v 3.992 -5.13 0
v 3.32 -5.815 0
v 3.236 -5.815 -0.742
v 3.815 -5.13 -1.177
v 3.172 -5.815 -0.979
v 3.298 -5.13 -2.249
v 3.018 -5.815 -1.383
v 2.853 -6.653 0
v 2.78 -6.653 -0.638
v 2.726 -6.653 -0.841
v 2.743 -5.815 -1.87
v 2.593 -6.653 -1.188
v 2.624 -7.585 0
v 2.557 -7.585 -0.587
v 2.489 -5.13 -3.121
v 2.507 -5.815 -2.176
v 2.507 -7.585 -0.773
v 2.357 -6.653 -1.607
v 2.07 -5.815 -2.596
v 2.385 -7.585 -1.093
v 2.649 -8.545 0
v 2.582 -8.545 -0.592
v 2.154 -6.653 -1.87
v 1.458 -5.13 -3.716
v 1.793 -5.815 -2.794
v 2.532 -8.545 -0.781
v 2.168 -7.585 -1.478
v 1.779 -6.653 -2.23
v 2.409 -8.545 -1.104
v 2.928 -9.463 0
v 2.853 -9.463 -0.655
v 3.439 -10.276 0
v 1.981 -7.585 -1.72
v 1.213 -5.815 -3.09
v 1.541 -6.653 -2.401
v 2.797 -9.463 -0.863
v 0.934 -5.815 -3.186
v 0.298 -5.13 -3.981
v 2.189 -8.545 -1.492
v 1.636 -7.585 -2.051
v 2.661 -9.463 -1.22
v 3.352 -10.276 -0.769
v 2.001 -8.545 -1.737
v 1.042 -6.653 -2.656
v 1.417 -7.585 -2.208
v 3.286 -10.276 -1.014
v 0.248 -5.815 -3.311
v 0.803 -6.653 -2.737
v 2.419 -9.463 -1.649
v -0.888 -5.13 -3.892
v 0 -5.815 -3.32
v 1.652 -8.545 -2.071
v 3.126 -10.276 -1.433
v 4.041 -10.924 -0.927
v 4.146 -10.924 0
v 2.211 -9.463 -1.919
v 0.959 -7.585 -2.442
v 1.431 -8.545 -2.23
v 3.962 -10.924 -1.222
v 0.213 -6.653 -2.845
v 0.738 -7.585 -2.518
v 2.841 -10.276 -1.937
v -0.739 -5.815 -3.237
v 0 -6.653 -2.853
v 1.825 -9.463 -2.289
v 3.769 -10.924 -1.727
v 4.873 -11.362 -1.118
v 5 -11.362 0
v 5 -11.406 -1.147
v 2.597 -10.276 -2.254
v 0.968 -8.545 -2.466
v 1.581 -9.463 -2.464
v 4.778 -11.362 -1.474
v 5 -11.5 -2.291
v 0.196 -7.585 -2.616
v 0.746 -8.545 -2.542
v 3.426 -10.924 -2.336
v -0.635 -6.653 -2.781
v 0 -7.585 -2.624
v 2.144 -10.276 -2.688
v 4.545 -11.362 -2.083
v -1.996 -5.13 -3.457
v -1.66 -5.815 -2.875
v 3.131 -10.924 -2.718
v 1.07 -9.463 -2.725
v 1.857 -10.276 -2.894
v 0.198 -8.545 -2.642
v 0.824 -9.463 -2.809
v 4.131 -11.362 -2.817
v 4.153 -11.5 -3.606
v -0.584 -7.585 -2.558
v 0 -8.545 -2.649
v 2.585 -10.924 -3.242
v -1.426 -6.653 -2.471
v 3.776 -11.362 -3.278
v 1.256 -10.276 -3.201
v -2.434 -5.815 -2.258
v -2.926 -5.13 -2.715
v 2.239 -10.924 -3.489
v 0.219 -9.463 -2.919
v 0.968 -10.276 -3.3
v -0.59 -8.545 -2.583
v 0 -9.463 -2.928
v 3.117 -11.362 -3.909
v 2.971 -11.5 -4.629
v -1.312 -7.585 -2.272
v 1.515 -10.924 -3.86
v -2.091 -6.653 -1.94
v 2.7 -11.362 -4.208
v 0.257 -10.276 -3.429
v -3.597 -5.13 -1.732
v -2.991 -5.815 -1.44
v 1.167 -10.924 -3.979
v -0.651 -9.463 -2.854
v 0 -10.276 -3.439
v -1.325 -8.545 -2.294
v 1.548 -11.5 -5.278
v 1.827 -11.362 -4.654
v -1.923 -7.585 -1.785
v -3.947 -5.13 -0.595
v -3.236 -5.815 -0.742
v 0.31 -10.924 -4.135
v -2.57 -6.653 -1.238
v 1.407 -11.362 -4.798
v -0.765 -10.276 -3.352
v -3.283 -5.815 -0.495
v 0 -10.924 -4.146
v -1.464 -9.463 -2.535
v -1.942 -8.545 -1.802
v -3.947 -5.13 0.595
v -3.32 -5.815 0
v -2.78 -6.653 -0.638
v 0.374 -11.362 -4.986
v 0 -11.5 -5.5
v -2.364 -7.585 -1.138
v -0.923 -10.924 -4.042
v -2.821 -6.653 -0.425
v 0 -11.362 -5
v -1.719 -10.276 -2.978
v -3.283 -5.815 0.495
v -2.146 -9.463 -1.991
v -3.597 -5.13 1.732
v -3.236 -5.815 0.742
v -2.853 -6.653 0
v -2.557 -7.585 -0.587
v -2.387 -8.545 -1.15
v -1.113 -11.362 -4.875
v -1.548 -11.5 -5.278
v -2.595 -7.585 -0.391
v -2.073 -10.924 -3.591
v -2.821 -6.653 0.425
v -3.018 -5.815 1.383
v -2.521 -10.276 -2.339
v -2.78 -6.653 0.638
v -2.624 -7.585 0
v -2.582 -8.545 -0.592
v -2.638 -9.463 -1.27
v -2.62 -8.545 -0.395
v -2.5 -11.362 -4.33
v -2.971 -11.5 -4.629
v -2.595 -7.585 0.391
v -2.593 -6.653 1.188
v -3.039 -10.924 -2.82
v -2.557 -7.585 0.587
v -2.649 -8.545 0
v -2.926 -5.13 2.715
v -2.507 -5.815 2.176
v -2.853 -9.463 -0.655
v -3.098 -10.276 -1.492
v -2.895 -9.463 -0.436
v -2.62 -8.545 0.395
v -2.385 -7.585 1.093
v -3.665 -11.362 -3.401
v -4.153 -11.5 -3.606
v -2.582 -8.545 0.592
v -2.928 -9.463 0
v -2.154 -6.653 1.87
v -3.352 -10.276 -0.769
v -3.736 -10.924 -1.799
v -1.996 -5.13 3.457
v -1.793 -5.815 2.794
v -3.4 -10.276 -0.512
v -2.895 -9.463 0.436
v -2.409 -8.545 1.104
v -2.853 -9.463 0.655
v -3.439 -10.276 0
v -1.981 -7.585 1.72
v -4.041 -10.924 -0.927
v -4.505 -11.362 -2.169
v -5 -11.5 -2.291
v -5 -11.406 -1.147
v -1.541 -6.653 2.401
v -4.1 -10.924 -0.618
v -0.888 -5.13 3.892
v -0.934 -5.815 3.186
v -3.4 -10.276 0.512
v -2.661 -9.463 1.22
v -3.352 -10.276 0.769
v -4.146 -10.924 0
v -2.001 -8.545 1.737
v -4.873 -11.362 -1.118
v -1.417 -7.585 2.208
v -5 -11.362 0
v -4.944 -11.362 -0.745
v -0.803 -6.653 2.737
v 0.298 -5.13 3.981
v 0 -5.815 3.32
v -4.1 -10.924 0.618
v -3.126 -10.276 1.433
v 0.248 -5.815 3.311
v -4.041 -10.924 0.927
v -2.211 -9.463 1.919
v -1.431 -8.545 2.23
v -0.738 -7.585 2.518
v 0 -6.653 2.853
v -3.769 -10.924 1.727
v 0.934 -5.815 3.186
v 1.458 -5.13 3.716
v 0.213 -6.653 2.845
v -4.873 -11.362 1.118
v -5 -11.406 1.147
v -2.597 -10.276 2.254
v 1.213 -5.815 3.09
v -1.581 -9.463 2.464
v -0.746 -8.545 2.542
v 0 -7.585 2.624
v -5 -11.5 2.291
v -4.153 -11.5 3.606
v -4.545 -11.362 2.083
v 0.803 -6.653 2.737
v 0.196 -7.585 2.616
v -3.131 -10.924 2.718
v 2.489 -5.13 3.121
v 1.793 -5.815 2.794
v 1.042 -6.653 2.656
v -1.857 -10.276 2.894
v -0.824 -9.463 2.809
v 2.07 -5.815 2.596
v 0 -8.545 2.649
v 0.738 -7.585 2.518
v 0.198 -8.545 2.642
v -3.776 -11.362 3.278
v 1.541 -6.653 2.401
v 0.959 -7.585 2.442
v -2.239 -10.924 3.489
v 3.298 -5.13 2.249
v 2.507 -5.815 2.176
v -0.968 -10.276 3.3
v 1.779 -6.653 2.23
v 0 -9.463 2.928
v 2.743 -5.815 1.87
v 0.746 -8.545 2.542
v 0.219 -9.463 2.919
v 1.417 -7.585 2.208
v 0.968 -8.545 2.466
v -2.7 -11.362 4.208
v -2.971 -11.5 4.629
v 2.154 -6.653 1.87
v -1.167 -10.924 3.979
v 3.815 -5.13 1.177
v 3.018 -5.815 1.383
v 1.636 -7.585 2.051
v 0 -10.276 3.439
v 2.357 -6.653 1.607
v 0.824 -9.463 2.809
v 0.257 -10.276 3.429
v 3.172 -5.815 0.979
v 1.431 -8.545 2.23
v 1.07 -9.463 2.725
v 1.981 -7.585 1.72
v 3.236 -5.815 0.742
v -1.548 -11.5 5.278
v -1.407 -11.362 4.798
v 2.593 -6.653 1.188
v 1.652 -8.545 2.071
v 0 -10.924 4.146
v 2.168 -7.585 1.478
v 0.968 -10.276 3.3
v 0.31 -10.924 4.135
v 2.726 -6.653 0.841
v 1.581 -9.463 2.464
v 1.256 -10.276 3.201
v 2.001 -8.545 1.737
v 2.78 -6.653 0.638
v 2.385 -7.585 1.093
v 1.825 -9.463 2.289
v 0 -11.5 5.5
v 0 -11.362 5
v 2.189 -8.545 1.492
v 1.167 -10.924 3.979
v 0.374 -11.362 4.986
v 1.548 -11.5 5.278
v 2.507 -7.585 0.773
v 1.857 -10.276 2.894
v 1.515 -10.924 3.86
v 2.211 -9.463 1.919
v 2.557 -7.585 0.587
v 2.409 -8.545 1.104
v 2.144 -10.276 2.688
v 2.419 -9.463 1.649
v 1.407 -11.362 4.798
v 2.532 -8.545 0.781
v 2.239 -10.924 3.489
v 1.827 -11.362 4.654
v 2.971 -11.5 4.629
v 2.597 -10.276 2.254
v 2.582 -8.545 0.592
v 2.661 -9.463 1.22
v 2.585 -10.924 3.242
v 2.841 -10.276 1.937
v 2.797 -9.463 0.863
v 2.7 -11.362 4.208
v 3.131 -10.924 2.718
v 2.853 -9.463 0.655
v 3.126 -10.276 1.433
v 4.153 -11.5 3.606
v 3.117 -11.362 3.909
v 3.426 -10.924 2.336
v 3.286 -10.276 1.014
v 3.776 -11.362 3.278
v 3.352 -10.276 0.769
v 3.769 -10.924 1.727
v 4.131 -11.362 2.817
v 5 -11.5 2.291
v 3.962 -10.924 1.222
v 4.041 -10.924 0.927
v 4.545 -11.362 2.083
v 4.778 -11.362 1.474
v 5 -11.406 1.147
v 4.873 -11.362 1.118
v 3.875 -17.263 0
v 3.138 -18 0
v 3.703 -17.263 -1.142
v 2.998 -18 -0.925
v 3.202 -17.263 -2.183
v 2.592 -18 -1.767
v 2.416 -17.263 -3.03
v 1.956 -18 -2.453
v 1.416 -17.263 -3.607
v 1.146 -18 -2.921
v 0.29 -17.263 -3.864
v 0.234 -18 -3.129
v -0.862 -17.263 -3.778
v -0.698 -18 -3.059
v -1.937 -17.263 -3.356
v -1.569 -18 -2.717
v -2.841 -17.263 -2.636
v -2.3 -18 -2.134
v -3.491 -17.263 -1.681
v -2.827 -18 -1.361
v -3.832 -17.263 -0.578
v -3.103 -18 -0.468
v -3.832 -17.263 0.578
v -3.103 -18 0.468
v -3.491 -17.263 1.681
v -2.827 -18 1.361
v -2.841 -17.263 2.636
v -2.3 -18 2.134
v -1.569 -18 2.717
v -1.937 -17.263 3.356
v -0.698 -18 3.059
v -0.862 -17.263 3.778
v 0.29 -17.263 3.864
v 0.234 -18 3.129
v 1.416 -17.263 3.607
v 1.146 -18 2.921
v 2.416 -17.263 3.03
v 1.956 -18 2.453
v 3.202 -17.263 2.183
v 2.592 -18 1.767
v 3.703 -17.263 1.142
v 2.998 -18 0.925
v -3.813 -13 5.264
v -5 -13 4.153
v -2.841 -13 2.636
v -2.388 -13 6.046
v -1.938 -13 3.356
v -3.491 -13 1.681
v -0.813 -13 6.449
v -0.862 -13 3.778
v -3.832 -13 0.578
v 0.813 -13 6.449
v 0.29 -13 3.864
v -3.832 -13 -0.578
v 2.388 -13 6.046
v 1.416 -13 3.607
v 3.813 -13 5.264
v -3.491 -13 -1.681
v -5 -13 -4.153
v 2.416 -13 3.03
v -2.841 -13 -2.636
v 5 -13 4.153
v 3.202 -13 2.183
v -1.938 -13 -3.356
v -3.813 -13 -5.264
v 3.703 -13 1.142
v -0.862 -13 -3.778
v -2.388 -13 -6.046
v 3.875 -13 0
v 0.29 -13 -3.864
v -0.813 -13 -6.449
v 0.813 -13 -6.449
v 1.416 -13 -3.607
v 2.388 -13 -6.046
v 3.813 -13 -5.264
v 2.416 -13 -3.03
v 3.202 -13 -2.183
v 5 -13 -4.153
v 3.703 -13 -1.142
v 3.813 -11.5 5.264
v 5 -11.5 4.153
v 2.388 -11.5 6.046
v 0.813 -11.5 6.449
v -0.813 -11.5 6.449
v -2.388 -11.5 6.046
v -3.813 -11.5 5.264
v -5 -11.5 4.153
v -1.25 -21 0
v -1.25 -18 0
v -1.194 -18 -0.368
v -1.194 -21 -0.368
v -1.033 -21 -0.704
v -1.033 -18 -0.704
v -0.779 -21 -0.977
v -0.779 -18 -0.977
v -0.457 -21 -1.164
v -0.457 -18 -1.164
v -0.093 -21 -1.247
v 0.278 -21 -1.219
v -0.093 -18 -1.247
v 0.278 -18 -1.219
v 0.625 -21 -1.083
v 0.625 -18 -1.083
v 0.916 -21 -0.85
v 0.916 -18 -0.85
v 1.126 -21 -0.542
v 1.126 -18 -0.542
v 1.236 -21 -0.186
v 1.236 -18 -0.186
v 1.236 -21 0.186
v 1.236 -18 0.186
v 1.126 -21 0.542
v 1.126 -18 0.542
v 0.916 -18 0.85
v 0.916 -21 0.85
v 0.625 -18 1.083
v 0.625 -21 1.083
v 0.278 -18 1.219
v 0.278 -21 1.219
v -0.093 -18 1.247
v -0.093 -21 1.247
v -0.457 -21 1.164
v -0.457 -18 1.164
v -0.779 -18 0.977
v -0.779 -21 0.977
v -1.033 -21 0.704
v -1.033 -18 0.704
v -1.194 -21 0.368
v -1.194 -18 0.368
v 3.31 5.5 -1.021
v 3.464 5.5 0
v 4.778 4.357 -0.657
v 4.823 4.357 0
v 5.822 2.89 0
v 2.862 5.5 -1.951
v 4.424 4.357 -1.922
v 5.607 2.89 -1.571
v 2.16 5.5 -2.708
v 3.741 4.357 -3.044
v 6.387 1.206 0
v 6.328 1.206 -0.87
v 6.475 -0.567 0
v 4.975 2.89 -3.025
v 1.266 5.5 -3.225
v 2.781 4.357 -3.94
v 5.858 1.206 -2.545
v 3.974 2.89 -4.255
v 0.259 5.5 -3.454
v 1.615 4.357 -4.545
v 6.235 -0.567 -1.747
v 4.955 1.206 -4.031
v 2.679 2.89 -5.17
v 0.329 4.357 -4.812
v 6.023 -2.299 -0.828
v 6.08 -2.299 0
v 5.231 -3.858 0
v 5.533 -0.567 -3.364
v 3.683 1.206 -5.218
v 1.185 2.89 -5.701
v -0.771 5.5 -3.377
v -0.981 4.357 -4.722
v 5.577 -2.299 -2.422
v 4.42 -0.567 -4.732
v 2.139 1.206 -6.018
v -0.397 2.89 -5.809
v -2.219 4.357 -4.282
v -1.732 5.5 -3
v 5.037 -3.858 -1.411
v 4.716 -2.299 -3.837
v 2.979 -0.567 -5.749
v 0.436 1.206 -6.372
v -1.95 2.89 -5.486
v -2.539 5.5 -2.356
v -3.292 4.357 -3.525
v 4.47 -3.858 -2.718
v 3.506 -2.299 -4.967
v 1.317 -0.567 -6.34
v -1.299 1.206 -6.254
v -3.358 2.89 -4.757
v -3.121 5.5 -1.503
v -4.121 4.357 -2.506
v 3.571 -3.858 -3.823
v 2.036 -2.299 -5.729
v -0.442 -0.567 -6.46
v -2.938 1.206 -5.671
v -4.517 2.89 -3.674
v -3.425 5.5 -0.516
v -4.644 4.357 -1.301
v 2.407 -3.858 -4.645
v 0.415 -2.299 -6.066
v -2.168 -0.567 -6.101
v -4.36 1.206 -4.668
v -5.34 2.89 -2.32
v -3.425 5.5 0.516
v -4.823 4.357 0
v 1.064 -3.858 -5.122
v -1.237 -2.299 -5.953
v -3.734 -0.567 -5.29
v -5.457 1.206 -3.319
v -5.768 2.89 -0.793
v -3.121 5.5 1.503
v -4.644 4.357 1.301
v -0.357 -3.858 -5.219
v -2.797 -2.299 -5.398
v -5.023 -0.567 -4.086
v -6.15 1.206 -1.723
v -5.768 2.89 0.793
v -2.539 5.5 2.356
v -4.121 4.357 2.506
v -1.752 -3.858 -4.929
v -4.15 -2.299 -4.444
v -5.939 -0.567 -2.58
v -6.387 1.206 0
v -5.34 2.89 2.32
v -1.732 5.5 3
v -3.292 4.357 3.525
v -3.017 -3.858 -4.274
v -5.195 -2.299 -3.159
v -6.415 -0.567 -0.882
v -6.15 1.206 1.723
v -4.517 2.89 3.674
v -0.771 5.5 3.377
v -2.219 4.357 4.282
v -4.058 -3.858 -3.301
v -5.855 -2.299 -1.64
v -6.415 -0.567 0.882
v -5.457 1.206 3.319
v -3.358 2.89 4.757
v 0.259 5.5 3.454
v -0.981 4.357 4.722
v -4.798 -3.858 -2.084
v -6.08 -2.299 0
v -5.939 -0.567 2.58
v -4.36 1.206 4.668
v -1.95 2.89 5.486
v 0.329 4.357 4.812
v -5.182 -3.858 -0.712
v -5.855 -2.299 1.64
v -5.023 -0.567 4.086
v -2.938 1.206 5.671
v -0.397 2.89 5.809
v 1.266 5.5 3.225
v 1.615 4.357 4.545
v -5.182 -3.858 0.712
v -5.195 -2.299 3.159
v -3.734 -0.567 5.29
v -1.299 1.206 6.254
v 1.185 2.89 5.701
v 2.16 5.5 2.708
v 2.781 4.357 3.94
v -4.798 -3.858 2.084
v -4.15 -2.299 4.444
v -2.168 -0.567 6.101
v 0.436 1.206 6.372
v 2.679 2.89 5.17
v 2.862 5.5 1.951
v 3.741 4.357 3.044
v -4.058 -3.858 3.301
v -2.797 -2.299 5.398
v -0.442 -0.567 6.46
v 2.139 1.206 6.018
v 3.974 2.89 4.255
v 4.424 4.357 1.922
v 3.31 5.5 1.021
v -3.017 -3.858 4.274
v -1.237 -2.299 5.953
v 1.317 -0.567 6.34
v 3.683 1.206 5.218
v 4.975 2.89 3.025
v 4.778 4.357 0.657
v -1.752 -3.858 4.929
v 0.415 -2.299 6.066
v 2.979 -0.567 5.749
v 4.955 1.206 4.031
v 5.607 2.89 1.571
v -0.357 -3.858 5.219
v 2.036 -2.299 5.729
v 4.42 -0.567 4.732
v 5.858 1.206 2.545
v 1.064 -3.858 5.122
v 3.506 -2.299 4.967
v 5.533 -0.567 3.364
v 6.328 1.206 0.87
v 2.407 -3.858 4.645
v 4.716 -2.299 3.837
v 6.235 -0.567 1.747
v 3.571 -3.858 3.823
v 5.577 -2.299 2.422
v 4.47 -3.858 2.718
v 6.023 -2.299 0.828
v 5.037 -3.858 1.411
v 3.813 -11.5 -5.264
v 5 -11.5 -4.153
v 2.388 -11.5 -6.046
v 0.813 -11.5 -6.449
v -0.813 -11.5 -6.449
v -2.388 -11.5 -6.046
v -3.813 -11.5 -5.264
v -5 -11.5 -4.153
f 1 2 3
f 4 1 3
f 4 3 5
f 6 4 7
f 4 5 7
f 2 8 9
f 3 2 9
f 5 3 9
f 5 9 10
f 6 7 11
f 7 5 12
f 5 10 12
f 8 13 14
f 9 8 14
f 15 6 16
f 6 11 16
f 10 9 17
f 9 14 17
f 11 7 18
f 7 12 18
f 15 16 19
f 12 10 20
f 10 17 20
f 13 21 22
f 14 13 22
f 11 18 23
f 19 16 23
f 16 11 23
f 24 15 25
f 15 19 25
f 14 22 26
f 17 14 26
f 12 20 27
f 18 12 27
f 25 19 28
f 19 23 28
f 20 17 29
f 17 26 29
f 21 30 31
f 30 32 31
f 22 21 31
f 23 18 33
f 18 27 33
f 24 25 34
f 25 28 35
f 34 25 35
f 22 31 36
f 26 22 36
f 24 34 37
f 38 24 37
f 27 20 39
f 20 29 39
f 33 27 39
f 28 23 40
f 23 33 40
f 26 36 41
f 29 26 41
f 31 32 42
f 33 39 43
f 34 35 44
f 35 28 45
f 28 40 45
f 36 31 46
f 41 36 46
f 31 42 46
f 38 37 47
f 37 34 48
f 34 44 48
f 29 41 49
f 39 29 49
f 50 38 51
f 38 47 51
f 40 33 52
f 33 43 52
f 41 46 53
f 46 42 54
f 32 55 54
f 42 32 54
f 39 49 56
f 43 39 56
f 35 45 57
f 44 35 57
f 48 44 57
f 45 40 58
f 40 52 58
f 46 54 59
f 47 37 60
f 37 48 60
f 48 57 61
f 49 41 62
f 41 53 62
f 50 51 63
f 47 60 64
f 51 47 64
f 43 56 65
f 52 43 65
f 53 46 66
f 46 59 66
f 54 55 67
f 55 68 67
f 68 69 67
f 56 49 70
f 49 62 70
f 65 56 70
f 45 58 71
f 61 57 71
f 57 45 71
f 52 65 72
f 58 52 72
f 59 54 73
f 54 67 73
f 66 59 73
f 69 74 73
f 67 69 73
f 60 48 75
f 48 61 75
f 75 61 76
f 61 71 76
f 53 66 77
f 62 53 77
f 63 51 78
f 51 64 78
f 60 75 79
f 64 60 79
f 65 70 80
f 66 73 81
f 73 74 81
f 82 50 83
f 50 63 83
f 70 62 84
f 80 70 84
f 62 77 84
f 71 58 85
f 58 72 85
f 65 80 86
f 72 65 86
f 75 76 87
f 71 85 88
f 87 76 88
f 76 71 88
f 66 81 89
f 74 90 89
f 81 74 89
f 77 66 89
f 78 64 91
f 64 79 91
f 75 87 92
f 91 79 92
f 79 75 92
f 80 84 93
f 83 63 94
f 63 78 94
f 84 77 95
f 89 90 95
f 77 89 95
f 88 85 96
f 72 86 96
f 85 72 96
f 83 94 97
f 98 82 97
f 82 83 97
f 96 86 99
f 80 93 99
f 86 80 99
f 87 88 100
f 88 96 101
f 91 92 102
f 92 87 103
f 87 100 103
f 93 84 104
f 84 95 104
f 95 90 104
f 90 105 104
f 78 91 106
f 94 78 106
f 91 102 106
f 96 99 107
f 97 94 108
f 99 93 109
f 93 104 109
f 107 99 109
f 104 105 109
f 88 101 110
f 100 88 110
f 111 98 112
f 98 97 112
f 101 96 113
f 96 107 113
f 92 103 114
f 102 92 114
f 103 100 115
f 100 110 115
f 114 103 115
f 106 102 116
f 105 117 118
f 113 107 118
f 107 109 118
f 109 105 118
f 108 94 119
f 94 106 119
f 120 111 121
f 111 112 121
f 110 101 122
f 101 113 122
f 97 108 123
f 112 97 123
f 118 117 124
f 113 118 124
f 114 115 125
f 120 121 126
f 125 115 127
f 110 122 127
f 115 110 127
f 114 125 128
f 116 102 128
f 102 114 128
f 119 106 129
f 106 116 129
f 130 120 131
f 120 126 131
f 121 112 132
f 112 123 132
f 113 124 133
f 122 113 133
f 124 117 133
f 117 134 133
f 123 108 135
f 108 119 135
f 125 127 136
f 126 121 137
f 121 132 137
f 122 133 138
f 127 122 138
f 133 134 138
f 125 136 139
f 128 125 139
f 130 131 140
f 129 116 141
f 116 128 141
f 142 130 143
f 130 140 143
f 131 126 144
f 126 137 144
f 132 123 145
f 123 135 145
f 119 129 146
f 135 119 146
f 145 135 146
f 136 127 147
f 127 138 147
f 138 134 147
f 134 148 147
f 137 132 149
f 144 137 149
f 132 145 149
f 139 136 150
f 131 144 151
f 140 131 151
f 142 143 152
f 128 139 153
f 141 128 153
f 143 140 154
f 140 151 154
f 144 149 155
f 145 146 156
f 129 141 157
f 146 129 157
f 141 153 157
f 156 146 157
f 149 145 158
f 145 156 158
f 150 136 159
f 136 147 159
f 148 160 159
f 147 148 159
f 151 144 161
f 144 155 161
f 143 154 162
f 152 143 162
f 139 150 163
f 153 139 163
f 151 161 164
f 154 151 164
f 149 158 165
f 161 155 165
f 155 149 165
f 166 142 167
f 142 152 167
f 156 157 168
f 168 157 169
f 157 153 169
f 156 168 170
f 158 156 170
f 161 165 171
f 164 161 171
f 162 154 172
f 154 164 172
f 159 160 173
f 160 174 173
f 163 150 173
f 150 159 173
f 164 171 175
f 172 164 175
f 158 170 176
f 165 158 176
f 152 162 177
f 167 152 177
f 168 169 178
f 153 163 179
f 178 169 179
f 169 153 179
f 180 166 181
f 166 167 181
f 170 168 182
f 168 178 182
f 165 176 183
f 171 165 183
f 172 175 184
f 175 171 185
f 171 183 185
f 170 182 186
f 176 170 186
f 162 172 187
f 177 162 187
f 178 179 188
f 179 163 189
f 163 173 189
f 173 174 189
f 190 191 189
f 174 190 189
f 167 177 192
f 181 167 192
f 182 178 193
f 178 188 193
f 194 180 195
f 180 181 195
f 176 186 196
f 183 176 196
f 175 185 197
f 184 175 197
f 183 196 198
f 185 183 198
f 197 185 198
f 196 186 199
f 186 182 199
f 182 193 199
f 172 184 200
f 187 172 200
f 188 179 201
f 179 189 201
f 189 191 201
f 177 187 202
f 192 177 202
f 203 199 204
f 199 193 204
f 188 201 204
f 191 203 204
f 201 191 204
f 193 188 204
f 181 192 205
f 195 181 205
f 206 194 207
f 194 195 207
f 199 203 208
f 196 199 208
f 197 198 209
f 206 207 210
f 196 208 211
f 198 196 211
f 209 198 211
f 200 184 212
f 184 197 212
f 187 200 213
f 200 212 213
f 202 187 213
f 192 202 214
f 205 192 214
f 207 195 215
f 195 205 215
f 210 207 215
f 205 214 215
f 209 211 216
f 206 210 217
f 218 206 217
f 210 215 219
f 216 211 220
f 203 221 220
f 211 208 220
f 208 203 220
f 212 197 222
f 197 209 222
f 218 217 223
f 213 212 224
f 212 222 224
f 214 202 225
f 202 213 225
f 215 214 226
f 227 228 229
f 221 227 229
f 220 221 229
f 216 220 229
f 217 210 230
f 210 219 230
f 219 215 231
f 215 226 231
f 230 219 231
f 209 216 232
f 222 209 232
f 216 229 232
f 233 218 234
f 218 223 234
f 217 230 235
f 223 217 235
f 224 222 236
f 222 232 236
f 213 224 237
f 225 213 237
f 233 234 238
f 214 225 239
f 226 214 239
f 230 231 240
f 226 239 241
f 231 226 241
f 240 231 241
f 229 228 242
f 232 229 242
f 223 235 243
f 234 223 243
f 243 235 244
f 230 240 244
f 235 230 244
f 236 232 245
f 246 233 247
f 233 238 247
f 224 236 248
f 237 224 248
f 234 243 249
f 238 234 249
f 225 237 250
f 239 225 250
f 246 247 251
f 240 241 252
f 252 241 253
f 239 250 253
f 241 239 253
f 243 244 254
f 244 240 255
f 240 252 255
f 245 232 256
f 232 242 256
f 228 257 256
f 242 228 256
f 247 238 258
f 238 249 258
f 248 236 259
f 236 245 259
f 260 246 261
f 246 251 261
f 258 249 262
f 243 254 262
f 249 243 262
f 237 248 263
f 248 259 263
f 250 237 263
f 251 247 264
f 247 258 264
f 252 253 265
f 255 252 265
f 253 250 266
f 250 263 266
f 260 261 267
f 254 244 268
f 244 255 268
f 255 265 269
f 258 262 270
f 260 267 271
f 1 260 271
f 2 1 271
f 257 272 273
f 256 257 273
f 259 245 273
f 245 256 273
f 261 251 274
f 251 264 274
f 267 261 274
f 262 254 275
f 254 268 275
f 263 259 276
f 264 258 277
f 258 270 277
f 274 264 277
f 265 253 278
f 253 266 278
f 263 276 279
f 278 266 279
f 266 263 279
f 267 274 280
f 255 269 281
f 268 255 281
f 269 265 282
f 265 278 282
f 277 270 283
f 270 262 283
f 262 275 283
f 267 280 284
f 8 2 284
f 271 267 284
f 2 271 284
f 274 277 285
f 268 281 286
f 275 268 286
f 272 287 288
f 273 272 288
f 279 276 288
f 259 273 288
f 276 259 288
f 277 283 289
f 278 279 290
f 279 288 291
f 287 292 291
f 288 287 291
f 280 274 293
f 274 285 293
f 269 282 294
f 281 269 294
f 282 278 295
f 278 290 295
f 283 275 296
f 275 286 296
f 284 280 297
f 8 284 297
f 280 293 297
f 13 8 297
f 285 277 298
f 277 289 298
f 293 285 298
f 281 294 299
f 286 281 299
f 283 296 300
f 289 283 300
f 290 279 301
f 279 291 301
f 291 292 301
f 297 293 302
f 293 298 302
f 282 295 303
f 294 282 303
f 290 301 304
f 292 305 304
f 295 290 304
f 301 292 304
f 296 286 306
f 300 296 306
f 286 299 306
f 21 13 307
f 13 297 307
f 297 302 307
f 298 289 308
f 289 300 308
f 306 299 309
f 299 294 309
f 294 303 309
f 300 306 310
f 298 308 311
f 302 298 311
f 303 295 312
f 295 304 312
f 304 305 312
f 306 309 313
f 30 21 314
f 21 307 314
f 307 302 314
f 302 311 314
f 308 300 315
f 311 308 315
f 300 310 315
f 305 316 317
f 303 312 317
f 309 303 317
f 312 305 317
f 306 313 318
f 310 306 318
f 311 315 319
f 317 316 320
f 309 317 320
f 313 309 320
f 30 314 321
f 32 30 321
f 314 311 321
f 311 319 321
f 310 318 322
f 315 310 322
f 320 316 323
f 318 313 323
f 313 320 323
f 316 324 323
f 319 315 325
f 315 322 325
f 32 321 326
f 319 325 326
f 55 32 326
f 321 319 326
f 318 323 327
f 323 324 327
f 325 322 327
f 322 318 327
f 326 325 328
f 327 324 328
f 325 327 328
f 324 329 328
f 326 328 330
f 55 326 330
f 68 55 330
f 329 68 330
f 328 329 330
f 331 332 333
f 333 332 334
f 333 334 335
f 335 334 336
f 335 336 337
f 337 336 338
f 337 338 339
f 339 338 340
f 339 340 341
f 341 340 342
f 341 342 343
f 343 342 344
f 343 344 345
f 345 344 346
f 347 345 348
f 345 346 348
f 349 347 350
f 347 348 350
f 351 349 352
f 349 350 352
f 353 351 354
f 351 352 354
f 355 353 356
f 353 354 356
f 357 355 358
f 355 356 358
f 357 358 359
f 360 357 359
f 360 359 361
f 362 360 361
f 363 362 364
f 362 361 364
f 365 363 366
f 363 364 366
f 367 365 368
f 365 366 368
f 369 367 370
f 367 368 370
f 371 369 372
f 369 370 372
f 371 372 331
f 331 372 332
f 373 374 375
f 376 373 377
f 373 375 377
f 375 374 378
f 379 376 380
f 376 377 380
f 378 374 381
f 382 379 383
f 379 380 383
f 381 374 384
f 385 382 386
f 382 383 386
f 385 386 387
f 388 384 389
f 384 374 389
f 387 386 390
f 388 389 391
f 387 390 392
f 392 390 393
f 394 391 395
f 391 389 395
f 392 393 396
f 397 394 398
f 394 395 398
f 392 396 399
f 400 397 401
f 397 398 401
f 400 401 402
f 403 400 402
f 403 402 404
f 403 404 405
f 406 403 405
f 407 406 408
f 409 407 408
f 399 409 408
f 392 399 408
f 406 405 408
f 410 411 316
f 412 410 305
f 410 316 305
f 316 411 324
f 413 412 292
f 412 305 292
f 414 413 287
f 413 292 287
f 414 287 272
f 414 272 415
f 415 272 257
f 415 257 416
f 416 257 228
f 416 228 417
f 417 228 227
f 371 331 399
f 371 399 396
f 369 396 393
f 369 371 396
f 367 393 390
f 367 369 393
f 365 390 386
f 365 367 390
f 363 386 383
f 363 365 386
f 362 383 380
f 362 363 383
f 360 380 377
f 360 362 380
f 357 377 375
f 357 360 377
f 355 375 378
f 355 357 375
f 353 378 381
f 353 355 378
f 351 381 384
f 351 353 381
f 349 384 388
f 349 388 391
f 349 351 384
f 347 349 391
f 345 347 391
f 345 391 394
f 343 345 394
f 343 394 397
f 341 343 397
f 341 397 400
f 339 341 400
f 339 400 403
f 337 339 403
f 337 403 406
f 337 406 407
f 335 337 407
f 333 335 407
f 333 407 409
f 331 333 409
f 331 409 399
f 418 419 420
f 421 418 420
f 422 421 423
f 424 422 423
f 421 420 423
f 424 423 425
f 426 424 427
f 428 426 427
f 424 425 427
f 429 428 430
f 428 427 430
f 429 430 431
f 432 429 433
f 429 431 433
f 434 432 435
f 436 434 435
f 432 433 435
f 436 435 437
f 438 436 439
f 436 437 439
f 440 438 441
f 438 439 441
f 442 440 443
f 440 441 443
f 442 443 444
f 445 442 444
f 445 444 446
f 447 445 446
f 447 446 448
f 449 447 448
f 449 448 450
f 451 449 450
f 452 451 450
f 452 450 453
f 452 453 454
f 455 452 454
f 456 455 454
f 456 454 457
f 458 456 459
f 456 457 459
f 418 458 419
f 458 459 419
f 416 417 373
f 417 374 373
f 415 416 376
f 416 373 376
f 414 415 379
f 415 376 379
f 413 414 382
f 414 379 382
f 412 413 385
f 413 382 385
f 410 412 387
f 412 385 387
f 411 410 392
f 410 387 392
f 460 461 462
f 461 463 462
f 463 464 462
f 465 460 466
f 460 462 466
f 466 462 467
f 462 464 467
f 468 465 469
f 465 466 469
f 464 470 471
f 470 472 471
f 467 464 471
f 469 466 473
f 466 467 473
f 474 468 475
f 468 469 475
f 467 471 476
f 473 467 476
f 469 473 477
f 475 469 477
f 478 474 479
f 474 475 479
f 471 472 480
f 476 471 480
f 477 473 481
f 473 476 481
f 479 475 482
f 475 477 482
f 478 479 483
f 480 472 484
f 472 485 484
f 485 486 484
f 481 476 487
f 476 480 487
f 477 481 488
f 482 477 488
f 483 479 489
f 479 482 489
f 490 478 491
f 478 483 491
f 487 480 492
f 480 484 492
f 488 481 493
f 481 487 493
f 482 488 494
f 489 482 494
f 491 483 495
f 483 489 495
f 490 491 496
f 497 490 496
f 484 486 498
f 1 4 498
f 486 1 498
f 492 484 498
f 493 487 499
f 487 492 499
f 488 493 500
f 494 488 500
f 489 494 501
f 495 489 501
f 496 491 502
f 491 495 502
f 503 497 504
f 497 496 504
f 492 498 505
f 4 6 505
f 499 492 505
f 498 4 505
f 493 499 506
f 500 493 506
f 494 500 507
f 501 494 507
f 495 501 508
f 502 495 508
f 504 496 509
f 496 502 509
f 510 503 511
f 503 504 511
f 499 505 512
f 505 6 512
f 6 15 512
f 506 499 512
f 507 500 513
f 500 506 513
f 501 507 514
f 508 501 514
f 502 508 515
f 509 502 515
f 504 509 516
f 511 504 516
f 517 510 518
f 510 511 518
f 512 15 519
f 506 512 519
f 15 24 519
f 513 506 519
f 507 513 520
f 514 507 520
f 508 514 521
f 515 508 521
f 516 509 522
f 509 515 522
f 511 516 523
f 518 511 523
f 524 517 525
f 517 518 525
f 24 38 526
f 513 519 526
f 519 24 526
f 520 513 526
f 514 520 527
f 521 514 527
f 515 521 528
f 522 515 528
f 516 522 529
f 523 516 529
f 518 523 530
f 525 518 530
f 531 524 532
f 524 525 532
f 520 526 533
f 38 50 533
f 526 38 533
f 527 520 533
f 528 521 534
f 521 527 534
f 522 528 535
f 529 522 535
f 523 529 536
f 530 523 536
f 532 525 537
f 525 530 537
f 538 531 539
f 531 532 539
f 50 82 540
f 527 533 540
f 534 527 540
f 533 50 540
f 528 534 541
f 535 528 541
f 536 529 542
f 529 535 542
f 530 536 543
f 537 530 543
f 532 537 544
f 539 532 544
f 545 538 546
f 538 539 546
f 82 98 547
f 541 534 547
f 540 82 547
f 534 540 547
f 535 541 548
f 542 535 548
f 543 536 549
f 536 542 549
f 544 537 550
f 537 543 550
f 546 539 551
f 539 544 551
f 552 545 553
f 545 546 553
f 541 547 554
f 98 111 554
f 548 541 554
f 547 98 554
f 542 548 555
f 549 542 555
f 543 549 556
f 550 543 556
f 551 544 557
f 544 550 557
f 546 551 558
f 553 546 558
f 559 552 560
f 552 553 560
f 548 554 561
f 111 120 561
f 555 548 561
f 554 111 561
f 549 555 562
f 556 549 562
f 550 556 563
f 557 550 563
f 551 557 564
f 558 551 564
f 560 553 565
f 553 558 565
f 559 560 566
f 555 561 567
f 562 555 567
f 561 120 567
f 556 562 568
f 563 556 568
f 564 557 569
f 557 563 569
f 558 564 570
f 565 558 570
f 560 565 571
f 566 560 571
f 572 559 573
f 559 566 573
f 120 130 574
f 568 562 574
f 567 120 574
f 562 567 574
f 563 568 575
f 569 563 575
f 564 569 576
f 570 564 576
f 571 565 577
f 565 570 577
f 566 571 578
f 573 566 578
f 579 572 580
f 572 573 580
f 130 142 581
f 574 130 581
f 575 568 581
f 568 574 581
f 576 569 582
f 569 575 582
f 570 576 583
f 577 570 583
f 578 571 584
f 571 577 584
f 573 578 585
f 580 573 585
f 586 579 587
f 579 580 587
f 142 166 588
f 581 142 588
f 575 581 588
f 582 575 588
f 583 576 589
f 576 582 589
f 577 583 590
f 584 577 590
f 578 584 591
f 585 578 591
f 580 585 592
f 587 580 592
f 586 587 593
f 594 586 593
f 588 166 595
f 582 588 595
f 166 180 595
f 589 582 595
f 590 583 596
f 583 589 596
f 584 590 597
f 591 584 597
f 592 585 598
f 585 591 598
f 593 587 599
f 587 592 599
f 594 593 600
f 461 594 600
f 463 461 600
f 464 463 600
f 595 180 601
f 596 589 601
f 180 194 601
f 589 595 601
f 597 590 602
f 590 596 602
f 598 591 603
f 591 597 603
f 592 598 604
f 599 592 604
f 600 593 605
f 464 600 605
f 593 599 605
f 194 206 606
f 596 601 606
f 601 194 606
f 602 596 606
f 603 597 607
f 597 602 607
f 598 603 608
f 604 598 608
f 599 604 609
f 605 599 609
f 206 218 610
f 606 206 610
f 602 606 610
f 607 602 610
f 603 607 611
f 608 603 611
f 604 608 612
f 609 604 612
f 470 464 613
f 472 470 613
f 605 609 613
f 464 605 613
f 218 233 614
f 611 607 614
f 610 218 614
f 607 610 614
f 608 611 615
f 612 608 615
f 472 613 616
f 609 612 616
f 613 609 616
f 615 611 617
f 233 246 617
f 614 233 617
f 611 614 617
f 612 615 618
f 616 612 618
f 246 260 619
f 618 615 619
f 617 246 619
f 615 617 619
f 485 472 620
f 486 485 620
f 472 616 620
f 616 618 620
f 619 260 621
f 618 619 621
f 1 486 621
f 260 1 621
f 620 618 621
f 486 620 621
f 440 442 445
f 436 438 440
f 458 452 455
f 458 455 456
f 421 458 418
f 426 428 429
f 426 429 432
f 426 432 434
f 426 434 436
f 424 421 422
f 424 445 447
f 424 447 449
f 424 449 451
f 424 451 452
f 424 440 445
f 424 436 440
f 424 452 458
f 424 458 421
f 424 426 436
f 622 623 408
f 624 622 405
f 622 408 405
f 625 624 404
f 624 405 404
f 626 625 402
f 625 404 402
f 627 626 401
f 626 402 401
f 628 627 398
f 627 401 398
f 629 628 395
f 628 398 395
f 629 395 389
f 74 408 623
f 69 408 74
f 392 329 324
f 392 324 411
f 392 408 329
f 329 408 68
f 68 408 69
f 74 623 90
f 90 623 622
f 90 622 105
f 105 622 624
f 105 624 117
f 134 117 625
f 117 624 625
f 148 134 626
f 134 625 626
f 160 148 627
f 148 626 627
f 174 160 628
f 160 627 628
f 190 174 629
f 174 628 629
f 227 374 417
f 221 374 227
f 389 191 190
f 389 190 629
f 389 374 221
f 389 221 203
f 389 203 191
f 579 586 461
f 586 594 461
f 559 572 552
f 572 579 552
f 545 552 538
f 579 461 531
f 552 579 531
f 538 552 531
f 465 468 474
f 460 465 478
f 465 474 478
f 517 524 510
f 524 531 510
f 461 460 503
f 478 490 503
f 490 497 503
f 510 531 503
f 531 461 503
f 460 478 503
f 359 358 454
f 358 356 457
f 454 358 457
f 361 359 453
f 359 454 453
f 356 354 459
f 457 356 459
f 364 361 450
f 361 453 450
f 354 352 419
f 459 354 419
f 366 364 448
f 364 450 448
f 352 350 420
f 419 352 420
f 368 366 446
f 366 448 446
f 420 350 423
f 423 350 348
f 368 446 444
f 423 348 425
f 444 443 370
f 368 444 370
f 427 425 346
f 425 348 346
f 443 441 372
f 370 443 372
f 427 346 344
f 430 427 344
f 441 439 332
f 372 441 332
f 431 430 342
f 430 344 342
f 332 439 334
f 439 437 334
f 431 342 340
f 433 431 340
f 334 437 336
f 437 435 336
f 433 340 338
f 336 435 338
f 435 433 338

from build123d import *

# Parameters (mm, degrees)
CUT_EXTRUDE4_DEPTH      = 5
CROQUIS1_R              = 1.25
SALIENTE_EXTRUIR1_DEPTH = 3
CROQUIS2_R              = 5
CROQUIS2_R_2            = 3.875
CORTAR_EXTRUIR2_DEPTH   = 5


with BuildPart() as part:
    # Sketch1 → Revolve1 (revolve)
    with BuildSketch(Plane.XY):
        with BuildLine():
            Line((4.304738622, -13), (4.304738622, -16.832856763))
            Line((4.304738622, -16.832856763), (3.137595386, -18))
            Line((3.137595386, -18), (0, -18))
            Line((0, -18), (0, -13))
            Line((0, -13), (0, 0))
            Line((0, 0), (0, 5.5))
            Line((0, 5.5), (3.464101615, 5.5))
            ThreePointArc((3.464101615, 5.5), (6.492002013, 0.322350532), (3.991907406, -5.129783159))
            ThreePointArc((3.991907406, -5.129783159), (2.699987373, -8.799256044), (5.5, -11.5))
            Line((5.5, -11.5), (6.5, -11.5))
            Line((6.5, -11.5), (6.5, -13))
            Line((6.5, -13), (4.304738622, -13))
        make_face()
    revolve(axis=Axis((0, -13, 0), (0, 1, 0)))

    # Sketch5 → Cut-Extrude4 (cut)
    with BuildSketch(Plane.XZ.offset(13)):
        with BuildLine():
            Line((-5, 4.153311931), (-5, -4.153311931))
            ThreePointArc((-5, -4.153311931), (-6.5, 0), (-5, 4.153311931))
        make_face()
        with BuildLine():
            Line((5, -4.153311931), (5, 4.153311931))
            ThreePointArc((5, 4.153311931), (6.5, 0), (5, -4.153311931))
        make_face()
    extrude(amount=-CUT_EXTRUDE4_DEPTH, mode=Mode.SUBTRACT)

    # Croquis1 → Saliente-Extruir1 (add)
    with BuildSketch(Plane(origin=(0, -18, 0), x_dir=(-1, 0, 0), z_dir=(0, -1, 0))):
        Circle(CROQUIS1_R)
    extrude(amount=SALIENTE_EXTRUIR1_DEPTH)

    # Croquis2 → Cortar-Extruir2 (cut)
    with BuildSketch(Plane.XZ.offset(18)):
        Circle(CROQUIS2_R)
        Circle(CROQUIS2_R_2, mode=Mode.SUBTRACT)
    extrude(amount=-CORTAR_EXTRUIR2_DEPTH, mode=Mode.SUBTRACT)


solid = part.part
